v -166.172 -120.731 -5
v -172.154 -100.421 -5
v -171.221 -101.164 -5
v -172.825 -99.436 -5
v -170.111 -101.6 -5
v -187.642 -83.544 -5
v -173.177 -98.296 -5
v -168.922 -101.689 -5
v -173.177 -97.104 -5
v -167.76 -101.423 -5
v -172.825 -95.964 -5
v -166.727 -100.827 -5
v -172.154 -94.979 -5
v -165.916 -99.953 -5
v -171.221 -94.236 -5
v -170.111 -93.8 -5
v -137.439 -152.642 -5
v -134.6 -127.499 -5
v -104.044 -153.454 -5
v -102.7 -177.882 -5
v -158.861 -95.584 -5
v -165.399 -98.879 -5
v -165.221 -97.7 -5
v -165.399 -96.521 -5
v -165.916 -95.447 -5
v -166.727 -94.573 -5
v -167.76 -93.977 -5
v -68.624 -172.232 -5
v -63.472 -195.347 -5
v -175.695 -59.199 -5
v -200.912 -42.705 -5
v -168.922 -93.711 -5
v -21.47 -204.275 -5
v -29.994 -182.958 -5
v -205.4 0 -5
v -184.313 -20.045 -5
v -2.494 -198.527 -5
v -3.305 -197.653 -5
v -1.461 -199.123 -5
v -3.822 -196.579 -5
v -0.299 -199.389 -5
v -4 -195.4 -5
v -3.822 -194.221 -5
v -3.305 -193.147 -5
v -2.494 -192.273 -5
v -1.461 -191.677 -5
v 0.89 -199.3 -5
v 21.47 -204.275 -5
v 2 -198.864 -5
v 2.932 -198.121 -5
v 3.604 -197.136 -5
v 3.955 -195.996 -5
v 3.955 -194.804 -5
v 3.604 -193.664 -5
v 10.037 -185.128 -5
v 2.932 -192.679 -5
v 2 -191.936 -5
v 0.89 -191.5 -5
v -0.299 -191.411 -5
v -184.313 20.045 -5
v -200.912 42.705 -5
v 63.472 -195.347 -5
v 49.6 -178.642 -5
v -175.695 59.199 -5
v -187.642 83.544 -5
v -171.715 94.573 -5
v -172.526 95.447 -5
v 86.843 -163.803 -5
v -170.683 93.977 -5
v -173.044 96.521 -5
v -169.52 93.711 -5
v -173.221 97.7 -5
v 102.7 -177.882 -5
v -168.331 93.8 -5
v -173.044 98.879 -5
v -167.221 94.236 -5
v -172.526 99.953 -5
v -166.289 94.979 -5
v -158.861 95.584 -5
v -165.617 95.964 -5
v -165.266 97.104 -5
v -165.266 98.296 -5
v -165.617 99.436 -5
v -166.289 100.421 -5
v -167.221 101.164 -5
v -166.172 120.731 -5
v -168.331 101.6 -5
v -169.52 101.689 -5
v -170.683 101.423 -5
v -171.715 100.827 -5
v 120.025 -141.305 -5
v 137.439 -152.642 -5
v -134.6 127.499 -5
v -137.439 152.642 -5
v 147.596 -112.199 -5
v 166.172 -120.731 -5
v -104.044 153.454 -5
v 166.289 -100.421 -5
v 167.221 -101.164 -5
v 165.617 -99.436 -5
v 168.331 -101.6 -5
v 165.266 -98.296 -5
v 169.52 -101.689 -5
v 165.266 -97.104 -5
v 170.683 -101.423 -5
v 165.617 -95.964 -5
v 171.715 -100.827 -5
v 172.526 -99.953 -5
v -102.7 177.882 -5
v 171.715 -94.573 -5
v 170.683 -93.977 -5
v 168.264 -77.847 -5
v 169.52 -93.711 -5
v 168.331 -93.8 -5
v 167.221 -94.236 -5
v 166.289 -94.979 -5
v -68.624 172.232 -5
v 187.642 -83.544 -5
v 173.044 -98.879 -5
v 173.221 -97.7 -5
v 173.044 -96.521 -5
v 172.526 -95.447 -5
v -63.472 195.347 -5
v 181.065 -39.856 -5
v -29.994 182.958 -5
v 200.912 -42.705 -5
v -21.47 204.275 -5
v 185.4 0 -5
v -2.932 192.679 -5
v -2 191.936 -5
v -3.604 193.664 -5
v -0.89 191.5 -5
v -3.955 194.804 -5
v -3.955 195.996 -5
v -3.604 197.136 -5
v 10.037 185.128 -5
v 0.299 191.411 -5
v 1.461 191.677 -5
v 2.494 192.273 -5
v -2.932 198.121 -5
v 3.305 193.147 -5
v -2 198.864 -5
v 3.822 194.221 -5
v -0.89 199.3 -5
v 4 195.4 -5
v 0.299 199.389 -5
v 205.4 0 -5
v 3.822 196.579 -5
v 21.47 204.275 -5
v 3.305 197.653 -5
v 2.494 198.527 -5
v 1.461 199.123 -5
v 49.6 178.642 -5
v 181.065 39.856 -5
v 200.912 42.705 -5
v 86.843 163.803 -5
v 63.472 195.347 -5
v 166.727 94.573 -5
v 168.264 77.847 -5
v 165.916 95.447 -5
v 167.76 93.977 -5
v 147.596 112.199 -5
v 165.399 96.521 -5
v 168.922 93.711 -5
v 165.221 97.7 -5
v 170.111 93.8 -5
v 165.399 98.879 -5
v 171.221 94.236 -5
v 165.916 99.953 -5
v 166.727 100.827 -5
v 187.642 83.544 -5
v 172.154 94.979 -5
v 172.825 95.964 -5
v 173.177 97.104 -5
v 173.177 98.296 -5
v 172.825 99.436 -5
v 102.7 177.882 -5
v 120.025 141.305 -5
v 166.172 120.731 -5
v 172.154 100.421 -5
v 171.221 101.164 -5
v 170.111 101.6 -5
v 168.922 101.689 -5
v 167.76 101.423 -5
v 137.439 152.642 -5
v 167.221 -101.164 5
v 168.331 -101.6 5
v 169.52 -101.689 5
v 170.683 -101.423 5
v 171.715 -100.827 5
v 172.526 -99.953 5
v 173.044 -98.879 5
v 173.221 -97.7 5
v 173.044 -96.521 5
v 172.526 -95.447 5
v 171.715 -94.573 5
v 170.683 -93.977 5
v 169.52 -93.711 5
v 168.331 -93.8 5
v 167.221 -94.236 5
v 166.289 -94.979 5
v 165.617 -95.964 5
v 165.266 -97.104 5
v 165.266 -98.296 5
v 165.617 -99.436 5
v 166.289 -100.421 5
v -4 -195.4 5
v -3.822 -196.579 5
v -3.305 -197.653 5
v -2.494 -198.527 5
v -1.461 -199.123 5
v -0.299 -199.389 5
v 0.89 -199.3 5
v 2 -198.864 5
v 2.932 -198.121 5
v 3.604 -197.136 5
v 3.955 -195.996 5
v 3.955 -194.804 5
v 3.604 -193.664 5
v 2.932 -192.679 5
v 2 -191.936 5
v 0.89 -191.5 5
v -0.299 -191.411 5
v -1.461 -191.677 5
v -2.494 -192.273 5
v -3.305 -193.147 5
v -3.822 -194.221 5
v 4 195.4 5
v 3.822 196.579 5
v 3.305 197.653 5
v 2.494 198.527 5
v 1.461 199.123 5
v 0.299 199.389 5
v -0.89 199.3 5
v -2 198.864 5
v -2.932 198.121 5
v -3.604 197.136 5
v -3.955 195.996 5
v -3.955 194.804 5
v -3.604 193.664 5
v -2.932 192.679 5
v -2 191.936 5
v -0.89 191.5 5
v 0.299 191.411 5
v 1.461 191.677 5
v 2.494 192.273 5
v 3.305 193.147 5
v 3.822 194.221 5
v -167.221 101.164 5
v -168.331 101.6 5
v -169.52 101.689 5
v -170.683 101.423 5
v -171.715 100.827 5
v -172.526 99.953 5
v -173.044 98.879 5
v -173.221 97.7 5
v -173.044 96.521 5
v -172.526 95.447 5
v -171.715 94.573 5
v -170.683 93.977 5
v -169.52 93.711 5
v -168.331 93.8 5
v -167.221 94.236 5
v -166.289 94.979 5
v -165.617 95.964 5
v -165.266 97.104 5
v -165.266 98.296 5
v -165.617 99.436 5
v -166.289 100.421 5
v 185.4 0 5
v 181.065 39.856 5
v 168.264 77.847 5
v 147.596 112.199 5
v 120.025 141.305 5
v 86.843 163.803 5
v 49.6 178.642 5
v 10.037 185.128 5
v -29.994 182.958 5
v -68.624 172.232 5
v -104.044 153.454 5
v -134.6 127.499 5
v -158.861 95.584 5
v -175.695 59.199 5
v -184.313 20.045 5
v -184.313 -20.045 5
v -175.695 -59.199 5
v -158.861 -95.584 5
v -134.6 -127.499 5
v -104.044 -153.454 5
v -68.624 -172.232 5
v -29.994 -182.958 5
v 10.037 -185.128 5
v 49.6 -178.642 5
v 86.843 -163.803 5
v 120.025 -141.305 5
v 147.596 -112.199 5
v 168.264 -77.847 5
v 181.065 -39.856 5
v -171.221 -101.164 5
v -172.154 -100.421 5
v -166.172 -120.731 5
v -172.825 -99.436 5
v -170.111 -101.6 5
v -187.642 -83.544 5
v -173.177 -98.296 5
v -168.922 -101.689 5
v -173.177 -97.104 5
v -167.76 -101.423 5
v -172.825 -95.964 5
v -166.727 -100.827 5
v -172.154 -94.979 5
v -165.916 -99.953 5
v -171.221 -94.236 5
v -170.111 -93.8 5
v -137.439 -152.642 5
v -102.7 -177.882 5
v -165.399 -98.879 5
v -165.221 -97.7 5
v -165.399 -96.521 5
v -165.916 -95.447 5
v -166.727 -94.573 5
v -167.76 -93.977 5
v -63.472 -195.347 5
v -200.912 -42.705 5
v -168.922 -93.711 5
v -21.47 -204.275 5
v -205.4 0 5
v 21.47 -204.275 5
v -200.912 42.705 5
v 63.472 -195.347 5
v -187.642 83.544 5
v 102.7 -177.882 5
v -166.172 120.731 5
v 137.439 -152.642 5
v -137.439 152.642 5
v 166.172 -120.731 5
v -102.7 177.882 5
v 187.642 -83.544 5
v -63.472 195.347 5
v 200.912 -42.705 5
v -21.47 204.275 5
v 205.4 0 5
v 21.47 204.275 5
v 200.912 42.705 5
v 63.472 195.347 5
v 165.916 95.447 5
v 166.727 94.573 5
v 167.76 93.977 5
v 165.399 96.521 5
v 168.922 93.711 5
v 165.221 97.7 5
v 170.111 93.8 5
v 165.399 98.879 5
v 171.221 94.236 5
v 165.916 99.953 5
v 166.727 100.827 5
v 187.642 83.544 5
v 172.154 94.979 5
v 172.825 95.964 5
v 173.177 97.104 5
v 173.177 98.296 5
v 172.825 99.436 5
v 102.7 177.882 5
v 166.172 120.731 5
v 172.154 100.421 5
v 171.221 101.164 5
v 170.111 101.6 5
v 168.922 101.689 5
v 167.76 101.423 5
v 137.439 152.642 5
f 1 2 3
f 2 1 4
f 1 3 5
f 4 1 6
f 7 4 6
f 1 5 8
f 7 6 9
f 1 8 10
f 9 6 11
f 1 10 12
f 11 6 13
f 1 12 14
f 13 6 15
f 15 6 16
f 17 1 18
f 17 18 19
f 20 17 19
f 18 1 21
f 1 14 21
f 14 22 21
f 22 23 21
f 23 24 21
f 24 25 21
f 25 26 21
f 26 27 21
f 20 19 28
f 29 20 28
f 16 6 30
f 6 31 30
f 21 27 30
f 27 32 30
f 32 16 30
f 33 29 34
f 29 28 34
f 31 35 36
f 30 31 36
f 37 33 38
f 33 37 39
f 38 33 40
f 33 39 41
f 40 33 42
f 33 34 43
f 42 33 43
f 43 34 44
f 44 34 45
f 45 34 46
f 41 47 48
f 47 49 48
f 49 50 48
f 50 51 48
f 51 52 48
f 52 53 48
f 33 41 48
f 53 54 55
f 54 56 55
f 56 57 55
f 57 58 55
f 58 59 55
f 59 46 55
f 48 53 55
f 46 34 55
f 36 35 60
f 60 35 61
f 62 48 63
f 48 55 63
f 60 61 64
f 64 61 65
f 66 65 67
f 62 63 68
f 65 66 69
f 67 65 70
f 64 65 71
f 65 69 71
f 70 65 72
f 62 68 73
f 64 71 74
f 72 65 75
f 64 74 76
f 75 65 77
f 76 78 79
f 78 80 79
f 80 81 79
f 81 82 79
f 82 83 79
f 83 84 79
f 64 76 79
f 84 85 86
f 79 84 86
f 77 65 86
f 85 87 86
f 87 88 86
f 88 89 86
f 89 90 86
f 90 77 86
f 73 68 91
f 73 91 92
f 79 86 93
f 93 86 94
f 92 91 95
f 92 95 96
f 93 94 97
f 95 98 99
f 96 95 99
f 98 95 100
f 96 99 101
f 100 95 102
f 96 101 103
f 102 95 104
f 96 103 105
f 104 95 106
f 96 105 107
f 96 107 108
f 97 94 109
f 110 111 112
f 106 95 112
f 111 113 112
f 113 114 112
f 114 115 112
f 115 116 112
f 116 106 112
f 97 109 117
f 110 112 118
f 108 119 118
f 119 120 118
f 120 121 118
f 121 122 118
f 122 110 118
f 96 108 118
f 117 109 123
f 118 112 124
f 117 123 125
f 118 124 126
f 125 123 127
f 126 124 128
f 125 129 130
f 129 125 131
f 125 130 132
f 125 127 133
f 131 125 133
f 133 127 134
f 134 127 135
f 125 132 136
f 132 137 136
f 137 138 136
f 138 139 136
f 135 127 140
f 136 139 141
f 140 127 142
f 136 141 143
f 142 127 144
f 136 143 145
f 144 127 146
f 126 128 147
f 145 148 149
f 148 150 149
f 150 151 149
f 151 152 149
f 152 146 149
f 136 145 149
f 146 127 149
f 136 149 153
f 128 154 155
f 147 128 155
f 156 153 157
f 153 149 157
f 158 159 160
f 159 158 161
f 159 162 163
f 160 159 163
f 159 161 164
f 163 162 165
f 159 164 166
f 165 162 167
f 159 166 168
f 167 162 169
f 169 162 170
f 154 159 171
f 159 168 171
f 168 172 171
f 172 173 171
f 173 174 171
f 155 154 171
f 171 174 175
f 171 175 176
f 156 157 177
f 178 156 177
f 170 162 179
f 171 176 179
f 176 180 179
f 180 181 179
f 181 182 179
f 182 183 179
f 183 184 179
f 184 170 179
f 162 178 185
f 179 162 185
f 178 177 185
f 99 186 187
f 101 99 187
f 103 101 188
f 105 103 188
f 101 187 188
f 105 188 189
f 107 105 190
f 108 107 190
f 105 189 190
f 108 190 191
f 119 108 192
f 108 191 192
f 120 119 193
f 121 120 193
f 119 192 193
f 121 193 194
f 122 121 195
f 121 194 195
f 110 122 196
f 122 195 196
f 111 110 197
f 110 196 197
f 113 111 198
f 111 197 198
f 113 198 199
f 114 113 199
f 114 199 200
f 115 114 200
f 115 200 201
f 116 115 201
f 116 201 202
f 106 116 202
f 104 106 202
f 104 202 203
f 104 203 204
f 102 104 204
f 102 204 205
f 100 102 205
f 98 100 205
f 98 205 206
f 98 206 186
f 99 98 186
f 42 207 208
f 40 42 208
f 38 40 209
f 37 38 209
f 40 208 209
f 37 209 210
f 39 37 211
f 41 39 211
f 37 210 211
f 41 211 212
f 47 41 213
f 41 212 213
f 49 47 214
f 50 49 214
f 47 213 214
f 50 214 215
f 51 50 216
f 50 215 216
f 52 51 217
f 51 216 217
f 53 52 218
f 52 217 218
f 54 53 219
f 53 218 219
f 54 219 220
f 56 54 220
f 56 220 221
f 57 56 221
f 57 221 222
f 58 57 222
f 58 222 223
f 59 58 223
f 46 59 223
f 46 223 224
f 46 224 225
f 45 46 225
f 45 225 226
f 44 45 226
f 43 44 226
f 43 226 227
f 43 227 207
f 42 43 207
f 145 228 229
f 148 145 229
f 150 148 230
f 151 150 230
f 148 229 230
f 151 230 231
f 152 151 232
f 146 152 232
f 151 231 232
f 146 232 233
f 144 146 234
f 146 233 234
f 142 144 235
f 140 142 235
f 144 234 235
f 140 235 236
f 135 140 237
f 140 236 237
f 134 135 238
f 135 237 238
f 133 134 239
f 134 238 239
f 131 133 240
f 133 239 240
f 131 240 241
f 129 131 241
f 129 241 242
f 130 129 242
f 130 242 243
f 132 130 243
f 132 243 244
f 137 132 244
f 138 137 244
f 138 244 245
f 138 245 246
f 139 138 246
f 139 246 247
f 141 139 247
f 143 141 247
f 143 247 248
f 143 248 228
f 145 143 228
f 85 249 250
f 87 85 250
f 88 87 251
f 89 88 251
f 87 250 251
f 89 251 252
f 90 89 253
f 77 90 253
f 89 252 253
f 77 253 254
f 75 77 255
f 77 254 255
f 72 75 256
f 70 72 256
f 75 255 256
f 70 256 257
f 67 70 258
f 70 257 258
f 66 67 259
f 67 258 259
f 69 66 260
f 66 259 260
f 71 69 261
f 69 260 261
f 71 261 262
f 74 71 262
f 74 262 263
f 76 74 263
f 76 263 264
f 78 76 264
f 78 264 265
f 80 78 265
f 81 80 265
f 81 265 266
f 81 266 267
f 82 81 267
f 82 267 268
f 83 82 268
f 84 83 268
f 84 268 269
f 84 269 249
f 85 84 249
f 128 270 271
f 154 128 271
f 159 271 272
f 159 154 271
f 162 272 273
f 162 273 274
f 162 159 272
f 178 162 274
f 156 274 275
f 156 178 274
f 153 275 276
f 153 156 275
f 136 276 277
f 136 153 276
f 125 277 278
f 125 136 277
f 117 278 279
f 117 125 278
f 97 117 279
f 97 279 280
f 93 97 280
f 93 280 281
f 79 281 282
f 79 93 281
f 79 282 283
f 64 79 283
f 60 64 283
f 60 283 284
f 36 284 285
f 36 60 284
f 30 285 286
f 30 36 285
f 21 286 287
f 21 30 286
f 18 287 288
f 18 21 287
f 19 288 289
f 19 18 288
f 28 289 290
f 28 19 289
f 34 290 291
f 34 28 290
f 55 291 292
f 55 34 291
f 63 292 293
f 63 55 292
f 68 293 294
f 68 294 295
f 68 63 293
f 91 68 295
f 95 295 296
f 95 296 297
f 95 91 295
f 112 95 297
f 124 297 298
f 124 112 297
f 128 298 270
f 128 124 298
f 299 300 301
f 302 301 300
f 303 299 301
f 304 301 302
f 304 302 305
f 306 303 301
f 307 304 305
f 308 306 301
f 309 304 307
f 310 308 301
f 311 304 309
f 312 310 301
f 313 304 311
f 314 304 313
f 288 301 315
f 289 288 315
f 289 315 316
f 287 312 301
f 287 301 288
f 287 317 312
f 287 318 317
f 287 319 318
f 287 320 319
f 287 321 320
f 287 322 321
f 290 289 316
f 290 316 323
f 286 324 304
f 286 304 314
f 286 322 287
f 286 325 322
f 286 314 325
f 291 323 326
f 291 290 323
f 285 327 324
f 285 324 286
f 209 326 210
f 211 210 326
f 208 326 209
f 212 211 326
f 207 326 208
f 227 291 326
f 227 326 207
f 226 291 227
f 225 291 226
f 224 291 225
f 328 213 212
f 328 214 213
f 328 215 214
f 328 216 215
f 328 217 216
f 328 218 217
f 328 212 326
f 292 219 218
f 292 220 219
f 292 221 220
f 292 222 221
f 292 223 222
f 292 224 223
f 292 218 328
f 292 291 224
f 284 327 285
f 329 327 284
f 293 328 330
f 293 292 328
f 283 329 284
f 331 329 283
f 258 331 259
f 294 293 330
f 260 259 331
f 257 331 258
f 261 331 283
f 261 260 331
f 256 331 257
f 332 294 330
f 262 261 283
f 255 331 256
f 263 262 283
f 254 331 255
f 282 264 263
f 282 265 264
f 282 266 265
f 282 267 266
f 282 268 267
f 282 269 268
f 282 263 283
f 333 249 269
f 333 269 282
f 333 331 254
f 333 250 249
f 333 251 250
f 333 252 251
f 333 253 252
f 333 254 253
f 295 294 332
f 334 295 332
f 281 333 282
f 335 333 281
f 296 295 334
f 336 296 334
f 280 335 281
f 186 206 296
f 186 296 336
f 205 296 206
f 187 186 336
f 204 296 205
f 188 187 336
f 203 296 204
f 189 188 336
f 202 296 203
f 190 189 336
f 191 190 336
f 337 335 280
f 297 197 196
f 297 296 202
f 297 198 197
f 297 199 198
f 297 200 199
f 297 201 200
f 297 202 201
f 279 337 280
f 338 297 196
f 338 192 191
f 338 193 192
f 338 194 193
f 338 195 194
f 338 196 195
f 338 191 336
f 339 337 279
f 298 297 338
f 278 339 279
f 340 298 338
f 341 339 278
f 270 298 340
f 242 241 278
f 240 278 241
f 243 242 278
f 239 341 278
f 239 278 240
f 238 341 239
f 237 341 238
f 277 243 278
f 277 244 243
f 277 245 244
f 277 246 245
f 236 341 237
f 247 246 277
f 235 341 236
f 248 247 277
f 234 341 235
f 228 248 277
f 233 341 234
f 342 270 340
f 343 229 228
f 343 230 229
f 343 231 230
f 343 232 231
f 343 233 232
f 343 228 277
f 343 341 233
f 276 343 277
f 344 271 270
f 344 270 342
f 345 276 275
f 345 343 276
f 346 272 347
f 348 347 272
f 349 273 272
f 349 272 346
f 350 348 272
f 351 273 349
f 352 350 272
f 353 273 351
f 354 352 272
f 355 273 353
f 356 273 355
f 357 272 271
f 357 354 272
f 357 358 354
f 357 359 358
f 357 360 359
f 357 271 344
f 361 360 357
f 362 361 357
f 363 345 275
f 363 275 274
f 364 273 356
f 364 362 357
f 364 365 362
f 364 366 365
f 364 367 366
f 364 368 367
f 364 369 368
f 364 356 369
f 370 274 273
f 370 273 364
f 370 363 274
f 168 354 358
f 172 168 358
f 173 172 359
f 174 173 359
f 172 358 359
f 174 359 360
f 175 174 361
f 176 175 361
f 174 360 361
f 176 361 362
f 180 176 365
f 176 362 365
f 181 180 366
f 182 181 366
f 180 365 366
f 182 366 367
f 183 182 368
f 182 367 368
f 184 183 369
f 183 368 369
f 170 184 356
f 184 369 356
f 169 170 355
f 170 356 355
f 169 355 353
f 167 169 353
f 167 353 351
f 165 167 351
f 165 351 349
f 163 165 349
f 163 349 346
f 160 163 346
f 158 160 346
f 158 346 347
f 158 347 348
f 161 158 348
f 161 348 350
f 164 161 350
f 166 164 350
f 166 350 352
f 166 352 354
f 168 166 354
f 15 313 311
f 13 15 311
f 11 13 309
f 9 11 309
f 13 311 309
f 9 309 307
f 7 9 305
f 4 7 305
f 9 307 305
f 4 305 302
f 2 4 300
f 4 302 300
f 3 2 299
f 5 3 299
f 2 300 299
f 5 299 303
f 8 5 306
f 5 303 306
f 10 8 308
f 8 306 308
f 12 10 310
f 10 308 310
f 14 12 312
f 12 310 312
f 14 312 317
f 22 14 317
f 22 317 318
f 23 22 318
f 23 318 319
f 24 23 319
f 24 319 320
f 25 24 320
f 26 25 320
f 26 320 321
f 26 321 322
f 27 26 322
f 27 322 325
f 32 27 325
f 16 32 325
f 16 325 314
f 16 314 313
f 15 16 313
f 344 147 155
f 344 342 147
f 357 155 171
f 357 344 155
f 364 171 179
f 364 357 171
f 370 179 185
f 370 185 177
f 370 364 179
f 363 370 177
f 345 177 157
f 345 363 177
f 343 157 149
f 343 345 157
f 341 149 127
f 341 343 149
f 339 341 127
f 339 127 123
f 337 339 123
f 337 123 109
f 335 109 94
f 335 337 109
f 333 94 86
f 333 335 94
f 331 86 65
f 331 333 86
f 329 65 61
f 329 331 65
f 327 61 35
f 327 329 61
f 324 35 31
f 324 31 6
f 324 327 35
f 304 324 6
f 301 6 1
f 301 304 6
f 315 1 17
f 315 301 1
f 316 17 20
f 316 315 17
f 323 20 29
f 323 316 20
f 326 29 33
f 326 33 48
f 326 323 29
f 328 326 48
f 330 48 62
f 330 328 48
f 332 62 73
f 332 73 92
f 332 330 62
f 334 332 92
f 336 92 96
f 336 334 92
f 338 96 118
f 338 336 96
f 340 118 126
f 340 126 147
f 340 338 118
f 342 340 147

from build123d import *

# Parameters (mm, degrees)
SKETCH1_R          = 205.4
SKETCH1_R_2        = 185.4
BODY_DEPTH         = 5
SKETCH2_R          = 4
CUT_EXTRUDE1_DEPTH = 11
HOLES_COUNT        = 6


with BuildPart() as part:
    # Sketch1 → Body (new body, symmetric)
    with BuildSketch(Plane.XY):
        Circle(SKETCH1_R)
        Circle(SKETCH1_R_2, mode=Mode.SUBTRACT)
    extrude(amount=BODY_DEPTH, both=True)

    # Sketch2 → Cut-Extrude1 (cut, through all)
    with BuildSketch(Plane.XY.offset(5)):
        with Locations((0, 195.4)):
            Circle(SKETCH2_R)
    cut_extrude1 = extrude(amount=-CUT_EXTRUDE1_DEPTH, mode=Mode.SUBTRACT)

    # Holes: Cut-Extrude1 ×6 about axis
    holes_axis = Axis((0, 0, 0), (0, 0, 1))
    for i in range(1, HOLES_COUNT):
        add(cut_extrude1.rotate(holes_axis, i * 360 / HOLES_COUNT), mode=Mode.SUBTRACT)


solid = part.part
